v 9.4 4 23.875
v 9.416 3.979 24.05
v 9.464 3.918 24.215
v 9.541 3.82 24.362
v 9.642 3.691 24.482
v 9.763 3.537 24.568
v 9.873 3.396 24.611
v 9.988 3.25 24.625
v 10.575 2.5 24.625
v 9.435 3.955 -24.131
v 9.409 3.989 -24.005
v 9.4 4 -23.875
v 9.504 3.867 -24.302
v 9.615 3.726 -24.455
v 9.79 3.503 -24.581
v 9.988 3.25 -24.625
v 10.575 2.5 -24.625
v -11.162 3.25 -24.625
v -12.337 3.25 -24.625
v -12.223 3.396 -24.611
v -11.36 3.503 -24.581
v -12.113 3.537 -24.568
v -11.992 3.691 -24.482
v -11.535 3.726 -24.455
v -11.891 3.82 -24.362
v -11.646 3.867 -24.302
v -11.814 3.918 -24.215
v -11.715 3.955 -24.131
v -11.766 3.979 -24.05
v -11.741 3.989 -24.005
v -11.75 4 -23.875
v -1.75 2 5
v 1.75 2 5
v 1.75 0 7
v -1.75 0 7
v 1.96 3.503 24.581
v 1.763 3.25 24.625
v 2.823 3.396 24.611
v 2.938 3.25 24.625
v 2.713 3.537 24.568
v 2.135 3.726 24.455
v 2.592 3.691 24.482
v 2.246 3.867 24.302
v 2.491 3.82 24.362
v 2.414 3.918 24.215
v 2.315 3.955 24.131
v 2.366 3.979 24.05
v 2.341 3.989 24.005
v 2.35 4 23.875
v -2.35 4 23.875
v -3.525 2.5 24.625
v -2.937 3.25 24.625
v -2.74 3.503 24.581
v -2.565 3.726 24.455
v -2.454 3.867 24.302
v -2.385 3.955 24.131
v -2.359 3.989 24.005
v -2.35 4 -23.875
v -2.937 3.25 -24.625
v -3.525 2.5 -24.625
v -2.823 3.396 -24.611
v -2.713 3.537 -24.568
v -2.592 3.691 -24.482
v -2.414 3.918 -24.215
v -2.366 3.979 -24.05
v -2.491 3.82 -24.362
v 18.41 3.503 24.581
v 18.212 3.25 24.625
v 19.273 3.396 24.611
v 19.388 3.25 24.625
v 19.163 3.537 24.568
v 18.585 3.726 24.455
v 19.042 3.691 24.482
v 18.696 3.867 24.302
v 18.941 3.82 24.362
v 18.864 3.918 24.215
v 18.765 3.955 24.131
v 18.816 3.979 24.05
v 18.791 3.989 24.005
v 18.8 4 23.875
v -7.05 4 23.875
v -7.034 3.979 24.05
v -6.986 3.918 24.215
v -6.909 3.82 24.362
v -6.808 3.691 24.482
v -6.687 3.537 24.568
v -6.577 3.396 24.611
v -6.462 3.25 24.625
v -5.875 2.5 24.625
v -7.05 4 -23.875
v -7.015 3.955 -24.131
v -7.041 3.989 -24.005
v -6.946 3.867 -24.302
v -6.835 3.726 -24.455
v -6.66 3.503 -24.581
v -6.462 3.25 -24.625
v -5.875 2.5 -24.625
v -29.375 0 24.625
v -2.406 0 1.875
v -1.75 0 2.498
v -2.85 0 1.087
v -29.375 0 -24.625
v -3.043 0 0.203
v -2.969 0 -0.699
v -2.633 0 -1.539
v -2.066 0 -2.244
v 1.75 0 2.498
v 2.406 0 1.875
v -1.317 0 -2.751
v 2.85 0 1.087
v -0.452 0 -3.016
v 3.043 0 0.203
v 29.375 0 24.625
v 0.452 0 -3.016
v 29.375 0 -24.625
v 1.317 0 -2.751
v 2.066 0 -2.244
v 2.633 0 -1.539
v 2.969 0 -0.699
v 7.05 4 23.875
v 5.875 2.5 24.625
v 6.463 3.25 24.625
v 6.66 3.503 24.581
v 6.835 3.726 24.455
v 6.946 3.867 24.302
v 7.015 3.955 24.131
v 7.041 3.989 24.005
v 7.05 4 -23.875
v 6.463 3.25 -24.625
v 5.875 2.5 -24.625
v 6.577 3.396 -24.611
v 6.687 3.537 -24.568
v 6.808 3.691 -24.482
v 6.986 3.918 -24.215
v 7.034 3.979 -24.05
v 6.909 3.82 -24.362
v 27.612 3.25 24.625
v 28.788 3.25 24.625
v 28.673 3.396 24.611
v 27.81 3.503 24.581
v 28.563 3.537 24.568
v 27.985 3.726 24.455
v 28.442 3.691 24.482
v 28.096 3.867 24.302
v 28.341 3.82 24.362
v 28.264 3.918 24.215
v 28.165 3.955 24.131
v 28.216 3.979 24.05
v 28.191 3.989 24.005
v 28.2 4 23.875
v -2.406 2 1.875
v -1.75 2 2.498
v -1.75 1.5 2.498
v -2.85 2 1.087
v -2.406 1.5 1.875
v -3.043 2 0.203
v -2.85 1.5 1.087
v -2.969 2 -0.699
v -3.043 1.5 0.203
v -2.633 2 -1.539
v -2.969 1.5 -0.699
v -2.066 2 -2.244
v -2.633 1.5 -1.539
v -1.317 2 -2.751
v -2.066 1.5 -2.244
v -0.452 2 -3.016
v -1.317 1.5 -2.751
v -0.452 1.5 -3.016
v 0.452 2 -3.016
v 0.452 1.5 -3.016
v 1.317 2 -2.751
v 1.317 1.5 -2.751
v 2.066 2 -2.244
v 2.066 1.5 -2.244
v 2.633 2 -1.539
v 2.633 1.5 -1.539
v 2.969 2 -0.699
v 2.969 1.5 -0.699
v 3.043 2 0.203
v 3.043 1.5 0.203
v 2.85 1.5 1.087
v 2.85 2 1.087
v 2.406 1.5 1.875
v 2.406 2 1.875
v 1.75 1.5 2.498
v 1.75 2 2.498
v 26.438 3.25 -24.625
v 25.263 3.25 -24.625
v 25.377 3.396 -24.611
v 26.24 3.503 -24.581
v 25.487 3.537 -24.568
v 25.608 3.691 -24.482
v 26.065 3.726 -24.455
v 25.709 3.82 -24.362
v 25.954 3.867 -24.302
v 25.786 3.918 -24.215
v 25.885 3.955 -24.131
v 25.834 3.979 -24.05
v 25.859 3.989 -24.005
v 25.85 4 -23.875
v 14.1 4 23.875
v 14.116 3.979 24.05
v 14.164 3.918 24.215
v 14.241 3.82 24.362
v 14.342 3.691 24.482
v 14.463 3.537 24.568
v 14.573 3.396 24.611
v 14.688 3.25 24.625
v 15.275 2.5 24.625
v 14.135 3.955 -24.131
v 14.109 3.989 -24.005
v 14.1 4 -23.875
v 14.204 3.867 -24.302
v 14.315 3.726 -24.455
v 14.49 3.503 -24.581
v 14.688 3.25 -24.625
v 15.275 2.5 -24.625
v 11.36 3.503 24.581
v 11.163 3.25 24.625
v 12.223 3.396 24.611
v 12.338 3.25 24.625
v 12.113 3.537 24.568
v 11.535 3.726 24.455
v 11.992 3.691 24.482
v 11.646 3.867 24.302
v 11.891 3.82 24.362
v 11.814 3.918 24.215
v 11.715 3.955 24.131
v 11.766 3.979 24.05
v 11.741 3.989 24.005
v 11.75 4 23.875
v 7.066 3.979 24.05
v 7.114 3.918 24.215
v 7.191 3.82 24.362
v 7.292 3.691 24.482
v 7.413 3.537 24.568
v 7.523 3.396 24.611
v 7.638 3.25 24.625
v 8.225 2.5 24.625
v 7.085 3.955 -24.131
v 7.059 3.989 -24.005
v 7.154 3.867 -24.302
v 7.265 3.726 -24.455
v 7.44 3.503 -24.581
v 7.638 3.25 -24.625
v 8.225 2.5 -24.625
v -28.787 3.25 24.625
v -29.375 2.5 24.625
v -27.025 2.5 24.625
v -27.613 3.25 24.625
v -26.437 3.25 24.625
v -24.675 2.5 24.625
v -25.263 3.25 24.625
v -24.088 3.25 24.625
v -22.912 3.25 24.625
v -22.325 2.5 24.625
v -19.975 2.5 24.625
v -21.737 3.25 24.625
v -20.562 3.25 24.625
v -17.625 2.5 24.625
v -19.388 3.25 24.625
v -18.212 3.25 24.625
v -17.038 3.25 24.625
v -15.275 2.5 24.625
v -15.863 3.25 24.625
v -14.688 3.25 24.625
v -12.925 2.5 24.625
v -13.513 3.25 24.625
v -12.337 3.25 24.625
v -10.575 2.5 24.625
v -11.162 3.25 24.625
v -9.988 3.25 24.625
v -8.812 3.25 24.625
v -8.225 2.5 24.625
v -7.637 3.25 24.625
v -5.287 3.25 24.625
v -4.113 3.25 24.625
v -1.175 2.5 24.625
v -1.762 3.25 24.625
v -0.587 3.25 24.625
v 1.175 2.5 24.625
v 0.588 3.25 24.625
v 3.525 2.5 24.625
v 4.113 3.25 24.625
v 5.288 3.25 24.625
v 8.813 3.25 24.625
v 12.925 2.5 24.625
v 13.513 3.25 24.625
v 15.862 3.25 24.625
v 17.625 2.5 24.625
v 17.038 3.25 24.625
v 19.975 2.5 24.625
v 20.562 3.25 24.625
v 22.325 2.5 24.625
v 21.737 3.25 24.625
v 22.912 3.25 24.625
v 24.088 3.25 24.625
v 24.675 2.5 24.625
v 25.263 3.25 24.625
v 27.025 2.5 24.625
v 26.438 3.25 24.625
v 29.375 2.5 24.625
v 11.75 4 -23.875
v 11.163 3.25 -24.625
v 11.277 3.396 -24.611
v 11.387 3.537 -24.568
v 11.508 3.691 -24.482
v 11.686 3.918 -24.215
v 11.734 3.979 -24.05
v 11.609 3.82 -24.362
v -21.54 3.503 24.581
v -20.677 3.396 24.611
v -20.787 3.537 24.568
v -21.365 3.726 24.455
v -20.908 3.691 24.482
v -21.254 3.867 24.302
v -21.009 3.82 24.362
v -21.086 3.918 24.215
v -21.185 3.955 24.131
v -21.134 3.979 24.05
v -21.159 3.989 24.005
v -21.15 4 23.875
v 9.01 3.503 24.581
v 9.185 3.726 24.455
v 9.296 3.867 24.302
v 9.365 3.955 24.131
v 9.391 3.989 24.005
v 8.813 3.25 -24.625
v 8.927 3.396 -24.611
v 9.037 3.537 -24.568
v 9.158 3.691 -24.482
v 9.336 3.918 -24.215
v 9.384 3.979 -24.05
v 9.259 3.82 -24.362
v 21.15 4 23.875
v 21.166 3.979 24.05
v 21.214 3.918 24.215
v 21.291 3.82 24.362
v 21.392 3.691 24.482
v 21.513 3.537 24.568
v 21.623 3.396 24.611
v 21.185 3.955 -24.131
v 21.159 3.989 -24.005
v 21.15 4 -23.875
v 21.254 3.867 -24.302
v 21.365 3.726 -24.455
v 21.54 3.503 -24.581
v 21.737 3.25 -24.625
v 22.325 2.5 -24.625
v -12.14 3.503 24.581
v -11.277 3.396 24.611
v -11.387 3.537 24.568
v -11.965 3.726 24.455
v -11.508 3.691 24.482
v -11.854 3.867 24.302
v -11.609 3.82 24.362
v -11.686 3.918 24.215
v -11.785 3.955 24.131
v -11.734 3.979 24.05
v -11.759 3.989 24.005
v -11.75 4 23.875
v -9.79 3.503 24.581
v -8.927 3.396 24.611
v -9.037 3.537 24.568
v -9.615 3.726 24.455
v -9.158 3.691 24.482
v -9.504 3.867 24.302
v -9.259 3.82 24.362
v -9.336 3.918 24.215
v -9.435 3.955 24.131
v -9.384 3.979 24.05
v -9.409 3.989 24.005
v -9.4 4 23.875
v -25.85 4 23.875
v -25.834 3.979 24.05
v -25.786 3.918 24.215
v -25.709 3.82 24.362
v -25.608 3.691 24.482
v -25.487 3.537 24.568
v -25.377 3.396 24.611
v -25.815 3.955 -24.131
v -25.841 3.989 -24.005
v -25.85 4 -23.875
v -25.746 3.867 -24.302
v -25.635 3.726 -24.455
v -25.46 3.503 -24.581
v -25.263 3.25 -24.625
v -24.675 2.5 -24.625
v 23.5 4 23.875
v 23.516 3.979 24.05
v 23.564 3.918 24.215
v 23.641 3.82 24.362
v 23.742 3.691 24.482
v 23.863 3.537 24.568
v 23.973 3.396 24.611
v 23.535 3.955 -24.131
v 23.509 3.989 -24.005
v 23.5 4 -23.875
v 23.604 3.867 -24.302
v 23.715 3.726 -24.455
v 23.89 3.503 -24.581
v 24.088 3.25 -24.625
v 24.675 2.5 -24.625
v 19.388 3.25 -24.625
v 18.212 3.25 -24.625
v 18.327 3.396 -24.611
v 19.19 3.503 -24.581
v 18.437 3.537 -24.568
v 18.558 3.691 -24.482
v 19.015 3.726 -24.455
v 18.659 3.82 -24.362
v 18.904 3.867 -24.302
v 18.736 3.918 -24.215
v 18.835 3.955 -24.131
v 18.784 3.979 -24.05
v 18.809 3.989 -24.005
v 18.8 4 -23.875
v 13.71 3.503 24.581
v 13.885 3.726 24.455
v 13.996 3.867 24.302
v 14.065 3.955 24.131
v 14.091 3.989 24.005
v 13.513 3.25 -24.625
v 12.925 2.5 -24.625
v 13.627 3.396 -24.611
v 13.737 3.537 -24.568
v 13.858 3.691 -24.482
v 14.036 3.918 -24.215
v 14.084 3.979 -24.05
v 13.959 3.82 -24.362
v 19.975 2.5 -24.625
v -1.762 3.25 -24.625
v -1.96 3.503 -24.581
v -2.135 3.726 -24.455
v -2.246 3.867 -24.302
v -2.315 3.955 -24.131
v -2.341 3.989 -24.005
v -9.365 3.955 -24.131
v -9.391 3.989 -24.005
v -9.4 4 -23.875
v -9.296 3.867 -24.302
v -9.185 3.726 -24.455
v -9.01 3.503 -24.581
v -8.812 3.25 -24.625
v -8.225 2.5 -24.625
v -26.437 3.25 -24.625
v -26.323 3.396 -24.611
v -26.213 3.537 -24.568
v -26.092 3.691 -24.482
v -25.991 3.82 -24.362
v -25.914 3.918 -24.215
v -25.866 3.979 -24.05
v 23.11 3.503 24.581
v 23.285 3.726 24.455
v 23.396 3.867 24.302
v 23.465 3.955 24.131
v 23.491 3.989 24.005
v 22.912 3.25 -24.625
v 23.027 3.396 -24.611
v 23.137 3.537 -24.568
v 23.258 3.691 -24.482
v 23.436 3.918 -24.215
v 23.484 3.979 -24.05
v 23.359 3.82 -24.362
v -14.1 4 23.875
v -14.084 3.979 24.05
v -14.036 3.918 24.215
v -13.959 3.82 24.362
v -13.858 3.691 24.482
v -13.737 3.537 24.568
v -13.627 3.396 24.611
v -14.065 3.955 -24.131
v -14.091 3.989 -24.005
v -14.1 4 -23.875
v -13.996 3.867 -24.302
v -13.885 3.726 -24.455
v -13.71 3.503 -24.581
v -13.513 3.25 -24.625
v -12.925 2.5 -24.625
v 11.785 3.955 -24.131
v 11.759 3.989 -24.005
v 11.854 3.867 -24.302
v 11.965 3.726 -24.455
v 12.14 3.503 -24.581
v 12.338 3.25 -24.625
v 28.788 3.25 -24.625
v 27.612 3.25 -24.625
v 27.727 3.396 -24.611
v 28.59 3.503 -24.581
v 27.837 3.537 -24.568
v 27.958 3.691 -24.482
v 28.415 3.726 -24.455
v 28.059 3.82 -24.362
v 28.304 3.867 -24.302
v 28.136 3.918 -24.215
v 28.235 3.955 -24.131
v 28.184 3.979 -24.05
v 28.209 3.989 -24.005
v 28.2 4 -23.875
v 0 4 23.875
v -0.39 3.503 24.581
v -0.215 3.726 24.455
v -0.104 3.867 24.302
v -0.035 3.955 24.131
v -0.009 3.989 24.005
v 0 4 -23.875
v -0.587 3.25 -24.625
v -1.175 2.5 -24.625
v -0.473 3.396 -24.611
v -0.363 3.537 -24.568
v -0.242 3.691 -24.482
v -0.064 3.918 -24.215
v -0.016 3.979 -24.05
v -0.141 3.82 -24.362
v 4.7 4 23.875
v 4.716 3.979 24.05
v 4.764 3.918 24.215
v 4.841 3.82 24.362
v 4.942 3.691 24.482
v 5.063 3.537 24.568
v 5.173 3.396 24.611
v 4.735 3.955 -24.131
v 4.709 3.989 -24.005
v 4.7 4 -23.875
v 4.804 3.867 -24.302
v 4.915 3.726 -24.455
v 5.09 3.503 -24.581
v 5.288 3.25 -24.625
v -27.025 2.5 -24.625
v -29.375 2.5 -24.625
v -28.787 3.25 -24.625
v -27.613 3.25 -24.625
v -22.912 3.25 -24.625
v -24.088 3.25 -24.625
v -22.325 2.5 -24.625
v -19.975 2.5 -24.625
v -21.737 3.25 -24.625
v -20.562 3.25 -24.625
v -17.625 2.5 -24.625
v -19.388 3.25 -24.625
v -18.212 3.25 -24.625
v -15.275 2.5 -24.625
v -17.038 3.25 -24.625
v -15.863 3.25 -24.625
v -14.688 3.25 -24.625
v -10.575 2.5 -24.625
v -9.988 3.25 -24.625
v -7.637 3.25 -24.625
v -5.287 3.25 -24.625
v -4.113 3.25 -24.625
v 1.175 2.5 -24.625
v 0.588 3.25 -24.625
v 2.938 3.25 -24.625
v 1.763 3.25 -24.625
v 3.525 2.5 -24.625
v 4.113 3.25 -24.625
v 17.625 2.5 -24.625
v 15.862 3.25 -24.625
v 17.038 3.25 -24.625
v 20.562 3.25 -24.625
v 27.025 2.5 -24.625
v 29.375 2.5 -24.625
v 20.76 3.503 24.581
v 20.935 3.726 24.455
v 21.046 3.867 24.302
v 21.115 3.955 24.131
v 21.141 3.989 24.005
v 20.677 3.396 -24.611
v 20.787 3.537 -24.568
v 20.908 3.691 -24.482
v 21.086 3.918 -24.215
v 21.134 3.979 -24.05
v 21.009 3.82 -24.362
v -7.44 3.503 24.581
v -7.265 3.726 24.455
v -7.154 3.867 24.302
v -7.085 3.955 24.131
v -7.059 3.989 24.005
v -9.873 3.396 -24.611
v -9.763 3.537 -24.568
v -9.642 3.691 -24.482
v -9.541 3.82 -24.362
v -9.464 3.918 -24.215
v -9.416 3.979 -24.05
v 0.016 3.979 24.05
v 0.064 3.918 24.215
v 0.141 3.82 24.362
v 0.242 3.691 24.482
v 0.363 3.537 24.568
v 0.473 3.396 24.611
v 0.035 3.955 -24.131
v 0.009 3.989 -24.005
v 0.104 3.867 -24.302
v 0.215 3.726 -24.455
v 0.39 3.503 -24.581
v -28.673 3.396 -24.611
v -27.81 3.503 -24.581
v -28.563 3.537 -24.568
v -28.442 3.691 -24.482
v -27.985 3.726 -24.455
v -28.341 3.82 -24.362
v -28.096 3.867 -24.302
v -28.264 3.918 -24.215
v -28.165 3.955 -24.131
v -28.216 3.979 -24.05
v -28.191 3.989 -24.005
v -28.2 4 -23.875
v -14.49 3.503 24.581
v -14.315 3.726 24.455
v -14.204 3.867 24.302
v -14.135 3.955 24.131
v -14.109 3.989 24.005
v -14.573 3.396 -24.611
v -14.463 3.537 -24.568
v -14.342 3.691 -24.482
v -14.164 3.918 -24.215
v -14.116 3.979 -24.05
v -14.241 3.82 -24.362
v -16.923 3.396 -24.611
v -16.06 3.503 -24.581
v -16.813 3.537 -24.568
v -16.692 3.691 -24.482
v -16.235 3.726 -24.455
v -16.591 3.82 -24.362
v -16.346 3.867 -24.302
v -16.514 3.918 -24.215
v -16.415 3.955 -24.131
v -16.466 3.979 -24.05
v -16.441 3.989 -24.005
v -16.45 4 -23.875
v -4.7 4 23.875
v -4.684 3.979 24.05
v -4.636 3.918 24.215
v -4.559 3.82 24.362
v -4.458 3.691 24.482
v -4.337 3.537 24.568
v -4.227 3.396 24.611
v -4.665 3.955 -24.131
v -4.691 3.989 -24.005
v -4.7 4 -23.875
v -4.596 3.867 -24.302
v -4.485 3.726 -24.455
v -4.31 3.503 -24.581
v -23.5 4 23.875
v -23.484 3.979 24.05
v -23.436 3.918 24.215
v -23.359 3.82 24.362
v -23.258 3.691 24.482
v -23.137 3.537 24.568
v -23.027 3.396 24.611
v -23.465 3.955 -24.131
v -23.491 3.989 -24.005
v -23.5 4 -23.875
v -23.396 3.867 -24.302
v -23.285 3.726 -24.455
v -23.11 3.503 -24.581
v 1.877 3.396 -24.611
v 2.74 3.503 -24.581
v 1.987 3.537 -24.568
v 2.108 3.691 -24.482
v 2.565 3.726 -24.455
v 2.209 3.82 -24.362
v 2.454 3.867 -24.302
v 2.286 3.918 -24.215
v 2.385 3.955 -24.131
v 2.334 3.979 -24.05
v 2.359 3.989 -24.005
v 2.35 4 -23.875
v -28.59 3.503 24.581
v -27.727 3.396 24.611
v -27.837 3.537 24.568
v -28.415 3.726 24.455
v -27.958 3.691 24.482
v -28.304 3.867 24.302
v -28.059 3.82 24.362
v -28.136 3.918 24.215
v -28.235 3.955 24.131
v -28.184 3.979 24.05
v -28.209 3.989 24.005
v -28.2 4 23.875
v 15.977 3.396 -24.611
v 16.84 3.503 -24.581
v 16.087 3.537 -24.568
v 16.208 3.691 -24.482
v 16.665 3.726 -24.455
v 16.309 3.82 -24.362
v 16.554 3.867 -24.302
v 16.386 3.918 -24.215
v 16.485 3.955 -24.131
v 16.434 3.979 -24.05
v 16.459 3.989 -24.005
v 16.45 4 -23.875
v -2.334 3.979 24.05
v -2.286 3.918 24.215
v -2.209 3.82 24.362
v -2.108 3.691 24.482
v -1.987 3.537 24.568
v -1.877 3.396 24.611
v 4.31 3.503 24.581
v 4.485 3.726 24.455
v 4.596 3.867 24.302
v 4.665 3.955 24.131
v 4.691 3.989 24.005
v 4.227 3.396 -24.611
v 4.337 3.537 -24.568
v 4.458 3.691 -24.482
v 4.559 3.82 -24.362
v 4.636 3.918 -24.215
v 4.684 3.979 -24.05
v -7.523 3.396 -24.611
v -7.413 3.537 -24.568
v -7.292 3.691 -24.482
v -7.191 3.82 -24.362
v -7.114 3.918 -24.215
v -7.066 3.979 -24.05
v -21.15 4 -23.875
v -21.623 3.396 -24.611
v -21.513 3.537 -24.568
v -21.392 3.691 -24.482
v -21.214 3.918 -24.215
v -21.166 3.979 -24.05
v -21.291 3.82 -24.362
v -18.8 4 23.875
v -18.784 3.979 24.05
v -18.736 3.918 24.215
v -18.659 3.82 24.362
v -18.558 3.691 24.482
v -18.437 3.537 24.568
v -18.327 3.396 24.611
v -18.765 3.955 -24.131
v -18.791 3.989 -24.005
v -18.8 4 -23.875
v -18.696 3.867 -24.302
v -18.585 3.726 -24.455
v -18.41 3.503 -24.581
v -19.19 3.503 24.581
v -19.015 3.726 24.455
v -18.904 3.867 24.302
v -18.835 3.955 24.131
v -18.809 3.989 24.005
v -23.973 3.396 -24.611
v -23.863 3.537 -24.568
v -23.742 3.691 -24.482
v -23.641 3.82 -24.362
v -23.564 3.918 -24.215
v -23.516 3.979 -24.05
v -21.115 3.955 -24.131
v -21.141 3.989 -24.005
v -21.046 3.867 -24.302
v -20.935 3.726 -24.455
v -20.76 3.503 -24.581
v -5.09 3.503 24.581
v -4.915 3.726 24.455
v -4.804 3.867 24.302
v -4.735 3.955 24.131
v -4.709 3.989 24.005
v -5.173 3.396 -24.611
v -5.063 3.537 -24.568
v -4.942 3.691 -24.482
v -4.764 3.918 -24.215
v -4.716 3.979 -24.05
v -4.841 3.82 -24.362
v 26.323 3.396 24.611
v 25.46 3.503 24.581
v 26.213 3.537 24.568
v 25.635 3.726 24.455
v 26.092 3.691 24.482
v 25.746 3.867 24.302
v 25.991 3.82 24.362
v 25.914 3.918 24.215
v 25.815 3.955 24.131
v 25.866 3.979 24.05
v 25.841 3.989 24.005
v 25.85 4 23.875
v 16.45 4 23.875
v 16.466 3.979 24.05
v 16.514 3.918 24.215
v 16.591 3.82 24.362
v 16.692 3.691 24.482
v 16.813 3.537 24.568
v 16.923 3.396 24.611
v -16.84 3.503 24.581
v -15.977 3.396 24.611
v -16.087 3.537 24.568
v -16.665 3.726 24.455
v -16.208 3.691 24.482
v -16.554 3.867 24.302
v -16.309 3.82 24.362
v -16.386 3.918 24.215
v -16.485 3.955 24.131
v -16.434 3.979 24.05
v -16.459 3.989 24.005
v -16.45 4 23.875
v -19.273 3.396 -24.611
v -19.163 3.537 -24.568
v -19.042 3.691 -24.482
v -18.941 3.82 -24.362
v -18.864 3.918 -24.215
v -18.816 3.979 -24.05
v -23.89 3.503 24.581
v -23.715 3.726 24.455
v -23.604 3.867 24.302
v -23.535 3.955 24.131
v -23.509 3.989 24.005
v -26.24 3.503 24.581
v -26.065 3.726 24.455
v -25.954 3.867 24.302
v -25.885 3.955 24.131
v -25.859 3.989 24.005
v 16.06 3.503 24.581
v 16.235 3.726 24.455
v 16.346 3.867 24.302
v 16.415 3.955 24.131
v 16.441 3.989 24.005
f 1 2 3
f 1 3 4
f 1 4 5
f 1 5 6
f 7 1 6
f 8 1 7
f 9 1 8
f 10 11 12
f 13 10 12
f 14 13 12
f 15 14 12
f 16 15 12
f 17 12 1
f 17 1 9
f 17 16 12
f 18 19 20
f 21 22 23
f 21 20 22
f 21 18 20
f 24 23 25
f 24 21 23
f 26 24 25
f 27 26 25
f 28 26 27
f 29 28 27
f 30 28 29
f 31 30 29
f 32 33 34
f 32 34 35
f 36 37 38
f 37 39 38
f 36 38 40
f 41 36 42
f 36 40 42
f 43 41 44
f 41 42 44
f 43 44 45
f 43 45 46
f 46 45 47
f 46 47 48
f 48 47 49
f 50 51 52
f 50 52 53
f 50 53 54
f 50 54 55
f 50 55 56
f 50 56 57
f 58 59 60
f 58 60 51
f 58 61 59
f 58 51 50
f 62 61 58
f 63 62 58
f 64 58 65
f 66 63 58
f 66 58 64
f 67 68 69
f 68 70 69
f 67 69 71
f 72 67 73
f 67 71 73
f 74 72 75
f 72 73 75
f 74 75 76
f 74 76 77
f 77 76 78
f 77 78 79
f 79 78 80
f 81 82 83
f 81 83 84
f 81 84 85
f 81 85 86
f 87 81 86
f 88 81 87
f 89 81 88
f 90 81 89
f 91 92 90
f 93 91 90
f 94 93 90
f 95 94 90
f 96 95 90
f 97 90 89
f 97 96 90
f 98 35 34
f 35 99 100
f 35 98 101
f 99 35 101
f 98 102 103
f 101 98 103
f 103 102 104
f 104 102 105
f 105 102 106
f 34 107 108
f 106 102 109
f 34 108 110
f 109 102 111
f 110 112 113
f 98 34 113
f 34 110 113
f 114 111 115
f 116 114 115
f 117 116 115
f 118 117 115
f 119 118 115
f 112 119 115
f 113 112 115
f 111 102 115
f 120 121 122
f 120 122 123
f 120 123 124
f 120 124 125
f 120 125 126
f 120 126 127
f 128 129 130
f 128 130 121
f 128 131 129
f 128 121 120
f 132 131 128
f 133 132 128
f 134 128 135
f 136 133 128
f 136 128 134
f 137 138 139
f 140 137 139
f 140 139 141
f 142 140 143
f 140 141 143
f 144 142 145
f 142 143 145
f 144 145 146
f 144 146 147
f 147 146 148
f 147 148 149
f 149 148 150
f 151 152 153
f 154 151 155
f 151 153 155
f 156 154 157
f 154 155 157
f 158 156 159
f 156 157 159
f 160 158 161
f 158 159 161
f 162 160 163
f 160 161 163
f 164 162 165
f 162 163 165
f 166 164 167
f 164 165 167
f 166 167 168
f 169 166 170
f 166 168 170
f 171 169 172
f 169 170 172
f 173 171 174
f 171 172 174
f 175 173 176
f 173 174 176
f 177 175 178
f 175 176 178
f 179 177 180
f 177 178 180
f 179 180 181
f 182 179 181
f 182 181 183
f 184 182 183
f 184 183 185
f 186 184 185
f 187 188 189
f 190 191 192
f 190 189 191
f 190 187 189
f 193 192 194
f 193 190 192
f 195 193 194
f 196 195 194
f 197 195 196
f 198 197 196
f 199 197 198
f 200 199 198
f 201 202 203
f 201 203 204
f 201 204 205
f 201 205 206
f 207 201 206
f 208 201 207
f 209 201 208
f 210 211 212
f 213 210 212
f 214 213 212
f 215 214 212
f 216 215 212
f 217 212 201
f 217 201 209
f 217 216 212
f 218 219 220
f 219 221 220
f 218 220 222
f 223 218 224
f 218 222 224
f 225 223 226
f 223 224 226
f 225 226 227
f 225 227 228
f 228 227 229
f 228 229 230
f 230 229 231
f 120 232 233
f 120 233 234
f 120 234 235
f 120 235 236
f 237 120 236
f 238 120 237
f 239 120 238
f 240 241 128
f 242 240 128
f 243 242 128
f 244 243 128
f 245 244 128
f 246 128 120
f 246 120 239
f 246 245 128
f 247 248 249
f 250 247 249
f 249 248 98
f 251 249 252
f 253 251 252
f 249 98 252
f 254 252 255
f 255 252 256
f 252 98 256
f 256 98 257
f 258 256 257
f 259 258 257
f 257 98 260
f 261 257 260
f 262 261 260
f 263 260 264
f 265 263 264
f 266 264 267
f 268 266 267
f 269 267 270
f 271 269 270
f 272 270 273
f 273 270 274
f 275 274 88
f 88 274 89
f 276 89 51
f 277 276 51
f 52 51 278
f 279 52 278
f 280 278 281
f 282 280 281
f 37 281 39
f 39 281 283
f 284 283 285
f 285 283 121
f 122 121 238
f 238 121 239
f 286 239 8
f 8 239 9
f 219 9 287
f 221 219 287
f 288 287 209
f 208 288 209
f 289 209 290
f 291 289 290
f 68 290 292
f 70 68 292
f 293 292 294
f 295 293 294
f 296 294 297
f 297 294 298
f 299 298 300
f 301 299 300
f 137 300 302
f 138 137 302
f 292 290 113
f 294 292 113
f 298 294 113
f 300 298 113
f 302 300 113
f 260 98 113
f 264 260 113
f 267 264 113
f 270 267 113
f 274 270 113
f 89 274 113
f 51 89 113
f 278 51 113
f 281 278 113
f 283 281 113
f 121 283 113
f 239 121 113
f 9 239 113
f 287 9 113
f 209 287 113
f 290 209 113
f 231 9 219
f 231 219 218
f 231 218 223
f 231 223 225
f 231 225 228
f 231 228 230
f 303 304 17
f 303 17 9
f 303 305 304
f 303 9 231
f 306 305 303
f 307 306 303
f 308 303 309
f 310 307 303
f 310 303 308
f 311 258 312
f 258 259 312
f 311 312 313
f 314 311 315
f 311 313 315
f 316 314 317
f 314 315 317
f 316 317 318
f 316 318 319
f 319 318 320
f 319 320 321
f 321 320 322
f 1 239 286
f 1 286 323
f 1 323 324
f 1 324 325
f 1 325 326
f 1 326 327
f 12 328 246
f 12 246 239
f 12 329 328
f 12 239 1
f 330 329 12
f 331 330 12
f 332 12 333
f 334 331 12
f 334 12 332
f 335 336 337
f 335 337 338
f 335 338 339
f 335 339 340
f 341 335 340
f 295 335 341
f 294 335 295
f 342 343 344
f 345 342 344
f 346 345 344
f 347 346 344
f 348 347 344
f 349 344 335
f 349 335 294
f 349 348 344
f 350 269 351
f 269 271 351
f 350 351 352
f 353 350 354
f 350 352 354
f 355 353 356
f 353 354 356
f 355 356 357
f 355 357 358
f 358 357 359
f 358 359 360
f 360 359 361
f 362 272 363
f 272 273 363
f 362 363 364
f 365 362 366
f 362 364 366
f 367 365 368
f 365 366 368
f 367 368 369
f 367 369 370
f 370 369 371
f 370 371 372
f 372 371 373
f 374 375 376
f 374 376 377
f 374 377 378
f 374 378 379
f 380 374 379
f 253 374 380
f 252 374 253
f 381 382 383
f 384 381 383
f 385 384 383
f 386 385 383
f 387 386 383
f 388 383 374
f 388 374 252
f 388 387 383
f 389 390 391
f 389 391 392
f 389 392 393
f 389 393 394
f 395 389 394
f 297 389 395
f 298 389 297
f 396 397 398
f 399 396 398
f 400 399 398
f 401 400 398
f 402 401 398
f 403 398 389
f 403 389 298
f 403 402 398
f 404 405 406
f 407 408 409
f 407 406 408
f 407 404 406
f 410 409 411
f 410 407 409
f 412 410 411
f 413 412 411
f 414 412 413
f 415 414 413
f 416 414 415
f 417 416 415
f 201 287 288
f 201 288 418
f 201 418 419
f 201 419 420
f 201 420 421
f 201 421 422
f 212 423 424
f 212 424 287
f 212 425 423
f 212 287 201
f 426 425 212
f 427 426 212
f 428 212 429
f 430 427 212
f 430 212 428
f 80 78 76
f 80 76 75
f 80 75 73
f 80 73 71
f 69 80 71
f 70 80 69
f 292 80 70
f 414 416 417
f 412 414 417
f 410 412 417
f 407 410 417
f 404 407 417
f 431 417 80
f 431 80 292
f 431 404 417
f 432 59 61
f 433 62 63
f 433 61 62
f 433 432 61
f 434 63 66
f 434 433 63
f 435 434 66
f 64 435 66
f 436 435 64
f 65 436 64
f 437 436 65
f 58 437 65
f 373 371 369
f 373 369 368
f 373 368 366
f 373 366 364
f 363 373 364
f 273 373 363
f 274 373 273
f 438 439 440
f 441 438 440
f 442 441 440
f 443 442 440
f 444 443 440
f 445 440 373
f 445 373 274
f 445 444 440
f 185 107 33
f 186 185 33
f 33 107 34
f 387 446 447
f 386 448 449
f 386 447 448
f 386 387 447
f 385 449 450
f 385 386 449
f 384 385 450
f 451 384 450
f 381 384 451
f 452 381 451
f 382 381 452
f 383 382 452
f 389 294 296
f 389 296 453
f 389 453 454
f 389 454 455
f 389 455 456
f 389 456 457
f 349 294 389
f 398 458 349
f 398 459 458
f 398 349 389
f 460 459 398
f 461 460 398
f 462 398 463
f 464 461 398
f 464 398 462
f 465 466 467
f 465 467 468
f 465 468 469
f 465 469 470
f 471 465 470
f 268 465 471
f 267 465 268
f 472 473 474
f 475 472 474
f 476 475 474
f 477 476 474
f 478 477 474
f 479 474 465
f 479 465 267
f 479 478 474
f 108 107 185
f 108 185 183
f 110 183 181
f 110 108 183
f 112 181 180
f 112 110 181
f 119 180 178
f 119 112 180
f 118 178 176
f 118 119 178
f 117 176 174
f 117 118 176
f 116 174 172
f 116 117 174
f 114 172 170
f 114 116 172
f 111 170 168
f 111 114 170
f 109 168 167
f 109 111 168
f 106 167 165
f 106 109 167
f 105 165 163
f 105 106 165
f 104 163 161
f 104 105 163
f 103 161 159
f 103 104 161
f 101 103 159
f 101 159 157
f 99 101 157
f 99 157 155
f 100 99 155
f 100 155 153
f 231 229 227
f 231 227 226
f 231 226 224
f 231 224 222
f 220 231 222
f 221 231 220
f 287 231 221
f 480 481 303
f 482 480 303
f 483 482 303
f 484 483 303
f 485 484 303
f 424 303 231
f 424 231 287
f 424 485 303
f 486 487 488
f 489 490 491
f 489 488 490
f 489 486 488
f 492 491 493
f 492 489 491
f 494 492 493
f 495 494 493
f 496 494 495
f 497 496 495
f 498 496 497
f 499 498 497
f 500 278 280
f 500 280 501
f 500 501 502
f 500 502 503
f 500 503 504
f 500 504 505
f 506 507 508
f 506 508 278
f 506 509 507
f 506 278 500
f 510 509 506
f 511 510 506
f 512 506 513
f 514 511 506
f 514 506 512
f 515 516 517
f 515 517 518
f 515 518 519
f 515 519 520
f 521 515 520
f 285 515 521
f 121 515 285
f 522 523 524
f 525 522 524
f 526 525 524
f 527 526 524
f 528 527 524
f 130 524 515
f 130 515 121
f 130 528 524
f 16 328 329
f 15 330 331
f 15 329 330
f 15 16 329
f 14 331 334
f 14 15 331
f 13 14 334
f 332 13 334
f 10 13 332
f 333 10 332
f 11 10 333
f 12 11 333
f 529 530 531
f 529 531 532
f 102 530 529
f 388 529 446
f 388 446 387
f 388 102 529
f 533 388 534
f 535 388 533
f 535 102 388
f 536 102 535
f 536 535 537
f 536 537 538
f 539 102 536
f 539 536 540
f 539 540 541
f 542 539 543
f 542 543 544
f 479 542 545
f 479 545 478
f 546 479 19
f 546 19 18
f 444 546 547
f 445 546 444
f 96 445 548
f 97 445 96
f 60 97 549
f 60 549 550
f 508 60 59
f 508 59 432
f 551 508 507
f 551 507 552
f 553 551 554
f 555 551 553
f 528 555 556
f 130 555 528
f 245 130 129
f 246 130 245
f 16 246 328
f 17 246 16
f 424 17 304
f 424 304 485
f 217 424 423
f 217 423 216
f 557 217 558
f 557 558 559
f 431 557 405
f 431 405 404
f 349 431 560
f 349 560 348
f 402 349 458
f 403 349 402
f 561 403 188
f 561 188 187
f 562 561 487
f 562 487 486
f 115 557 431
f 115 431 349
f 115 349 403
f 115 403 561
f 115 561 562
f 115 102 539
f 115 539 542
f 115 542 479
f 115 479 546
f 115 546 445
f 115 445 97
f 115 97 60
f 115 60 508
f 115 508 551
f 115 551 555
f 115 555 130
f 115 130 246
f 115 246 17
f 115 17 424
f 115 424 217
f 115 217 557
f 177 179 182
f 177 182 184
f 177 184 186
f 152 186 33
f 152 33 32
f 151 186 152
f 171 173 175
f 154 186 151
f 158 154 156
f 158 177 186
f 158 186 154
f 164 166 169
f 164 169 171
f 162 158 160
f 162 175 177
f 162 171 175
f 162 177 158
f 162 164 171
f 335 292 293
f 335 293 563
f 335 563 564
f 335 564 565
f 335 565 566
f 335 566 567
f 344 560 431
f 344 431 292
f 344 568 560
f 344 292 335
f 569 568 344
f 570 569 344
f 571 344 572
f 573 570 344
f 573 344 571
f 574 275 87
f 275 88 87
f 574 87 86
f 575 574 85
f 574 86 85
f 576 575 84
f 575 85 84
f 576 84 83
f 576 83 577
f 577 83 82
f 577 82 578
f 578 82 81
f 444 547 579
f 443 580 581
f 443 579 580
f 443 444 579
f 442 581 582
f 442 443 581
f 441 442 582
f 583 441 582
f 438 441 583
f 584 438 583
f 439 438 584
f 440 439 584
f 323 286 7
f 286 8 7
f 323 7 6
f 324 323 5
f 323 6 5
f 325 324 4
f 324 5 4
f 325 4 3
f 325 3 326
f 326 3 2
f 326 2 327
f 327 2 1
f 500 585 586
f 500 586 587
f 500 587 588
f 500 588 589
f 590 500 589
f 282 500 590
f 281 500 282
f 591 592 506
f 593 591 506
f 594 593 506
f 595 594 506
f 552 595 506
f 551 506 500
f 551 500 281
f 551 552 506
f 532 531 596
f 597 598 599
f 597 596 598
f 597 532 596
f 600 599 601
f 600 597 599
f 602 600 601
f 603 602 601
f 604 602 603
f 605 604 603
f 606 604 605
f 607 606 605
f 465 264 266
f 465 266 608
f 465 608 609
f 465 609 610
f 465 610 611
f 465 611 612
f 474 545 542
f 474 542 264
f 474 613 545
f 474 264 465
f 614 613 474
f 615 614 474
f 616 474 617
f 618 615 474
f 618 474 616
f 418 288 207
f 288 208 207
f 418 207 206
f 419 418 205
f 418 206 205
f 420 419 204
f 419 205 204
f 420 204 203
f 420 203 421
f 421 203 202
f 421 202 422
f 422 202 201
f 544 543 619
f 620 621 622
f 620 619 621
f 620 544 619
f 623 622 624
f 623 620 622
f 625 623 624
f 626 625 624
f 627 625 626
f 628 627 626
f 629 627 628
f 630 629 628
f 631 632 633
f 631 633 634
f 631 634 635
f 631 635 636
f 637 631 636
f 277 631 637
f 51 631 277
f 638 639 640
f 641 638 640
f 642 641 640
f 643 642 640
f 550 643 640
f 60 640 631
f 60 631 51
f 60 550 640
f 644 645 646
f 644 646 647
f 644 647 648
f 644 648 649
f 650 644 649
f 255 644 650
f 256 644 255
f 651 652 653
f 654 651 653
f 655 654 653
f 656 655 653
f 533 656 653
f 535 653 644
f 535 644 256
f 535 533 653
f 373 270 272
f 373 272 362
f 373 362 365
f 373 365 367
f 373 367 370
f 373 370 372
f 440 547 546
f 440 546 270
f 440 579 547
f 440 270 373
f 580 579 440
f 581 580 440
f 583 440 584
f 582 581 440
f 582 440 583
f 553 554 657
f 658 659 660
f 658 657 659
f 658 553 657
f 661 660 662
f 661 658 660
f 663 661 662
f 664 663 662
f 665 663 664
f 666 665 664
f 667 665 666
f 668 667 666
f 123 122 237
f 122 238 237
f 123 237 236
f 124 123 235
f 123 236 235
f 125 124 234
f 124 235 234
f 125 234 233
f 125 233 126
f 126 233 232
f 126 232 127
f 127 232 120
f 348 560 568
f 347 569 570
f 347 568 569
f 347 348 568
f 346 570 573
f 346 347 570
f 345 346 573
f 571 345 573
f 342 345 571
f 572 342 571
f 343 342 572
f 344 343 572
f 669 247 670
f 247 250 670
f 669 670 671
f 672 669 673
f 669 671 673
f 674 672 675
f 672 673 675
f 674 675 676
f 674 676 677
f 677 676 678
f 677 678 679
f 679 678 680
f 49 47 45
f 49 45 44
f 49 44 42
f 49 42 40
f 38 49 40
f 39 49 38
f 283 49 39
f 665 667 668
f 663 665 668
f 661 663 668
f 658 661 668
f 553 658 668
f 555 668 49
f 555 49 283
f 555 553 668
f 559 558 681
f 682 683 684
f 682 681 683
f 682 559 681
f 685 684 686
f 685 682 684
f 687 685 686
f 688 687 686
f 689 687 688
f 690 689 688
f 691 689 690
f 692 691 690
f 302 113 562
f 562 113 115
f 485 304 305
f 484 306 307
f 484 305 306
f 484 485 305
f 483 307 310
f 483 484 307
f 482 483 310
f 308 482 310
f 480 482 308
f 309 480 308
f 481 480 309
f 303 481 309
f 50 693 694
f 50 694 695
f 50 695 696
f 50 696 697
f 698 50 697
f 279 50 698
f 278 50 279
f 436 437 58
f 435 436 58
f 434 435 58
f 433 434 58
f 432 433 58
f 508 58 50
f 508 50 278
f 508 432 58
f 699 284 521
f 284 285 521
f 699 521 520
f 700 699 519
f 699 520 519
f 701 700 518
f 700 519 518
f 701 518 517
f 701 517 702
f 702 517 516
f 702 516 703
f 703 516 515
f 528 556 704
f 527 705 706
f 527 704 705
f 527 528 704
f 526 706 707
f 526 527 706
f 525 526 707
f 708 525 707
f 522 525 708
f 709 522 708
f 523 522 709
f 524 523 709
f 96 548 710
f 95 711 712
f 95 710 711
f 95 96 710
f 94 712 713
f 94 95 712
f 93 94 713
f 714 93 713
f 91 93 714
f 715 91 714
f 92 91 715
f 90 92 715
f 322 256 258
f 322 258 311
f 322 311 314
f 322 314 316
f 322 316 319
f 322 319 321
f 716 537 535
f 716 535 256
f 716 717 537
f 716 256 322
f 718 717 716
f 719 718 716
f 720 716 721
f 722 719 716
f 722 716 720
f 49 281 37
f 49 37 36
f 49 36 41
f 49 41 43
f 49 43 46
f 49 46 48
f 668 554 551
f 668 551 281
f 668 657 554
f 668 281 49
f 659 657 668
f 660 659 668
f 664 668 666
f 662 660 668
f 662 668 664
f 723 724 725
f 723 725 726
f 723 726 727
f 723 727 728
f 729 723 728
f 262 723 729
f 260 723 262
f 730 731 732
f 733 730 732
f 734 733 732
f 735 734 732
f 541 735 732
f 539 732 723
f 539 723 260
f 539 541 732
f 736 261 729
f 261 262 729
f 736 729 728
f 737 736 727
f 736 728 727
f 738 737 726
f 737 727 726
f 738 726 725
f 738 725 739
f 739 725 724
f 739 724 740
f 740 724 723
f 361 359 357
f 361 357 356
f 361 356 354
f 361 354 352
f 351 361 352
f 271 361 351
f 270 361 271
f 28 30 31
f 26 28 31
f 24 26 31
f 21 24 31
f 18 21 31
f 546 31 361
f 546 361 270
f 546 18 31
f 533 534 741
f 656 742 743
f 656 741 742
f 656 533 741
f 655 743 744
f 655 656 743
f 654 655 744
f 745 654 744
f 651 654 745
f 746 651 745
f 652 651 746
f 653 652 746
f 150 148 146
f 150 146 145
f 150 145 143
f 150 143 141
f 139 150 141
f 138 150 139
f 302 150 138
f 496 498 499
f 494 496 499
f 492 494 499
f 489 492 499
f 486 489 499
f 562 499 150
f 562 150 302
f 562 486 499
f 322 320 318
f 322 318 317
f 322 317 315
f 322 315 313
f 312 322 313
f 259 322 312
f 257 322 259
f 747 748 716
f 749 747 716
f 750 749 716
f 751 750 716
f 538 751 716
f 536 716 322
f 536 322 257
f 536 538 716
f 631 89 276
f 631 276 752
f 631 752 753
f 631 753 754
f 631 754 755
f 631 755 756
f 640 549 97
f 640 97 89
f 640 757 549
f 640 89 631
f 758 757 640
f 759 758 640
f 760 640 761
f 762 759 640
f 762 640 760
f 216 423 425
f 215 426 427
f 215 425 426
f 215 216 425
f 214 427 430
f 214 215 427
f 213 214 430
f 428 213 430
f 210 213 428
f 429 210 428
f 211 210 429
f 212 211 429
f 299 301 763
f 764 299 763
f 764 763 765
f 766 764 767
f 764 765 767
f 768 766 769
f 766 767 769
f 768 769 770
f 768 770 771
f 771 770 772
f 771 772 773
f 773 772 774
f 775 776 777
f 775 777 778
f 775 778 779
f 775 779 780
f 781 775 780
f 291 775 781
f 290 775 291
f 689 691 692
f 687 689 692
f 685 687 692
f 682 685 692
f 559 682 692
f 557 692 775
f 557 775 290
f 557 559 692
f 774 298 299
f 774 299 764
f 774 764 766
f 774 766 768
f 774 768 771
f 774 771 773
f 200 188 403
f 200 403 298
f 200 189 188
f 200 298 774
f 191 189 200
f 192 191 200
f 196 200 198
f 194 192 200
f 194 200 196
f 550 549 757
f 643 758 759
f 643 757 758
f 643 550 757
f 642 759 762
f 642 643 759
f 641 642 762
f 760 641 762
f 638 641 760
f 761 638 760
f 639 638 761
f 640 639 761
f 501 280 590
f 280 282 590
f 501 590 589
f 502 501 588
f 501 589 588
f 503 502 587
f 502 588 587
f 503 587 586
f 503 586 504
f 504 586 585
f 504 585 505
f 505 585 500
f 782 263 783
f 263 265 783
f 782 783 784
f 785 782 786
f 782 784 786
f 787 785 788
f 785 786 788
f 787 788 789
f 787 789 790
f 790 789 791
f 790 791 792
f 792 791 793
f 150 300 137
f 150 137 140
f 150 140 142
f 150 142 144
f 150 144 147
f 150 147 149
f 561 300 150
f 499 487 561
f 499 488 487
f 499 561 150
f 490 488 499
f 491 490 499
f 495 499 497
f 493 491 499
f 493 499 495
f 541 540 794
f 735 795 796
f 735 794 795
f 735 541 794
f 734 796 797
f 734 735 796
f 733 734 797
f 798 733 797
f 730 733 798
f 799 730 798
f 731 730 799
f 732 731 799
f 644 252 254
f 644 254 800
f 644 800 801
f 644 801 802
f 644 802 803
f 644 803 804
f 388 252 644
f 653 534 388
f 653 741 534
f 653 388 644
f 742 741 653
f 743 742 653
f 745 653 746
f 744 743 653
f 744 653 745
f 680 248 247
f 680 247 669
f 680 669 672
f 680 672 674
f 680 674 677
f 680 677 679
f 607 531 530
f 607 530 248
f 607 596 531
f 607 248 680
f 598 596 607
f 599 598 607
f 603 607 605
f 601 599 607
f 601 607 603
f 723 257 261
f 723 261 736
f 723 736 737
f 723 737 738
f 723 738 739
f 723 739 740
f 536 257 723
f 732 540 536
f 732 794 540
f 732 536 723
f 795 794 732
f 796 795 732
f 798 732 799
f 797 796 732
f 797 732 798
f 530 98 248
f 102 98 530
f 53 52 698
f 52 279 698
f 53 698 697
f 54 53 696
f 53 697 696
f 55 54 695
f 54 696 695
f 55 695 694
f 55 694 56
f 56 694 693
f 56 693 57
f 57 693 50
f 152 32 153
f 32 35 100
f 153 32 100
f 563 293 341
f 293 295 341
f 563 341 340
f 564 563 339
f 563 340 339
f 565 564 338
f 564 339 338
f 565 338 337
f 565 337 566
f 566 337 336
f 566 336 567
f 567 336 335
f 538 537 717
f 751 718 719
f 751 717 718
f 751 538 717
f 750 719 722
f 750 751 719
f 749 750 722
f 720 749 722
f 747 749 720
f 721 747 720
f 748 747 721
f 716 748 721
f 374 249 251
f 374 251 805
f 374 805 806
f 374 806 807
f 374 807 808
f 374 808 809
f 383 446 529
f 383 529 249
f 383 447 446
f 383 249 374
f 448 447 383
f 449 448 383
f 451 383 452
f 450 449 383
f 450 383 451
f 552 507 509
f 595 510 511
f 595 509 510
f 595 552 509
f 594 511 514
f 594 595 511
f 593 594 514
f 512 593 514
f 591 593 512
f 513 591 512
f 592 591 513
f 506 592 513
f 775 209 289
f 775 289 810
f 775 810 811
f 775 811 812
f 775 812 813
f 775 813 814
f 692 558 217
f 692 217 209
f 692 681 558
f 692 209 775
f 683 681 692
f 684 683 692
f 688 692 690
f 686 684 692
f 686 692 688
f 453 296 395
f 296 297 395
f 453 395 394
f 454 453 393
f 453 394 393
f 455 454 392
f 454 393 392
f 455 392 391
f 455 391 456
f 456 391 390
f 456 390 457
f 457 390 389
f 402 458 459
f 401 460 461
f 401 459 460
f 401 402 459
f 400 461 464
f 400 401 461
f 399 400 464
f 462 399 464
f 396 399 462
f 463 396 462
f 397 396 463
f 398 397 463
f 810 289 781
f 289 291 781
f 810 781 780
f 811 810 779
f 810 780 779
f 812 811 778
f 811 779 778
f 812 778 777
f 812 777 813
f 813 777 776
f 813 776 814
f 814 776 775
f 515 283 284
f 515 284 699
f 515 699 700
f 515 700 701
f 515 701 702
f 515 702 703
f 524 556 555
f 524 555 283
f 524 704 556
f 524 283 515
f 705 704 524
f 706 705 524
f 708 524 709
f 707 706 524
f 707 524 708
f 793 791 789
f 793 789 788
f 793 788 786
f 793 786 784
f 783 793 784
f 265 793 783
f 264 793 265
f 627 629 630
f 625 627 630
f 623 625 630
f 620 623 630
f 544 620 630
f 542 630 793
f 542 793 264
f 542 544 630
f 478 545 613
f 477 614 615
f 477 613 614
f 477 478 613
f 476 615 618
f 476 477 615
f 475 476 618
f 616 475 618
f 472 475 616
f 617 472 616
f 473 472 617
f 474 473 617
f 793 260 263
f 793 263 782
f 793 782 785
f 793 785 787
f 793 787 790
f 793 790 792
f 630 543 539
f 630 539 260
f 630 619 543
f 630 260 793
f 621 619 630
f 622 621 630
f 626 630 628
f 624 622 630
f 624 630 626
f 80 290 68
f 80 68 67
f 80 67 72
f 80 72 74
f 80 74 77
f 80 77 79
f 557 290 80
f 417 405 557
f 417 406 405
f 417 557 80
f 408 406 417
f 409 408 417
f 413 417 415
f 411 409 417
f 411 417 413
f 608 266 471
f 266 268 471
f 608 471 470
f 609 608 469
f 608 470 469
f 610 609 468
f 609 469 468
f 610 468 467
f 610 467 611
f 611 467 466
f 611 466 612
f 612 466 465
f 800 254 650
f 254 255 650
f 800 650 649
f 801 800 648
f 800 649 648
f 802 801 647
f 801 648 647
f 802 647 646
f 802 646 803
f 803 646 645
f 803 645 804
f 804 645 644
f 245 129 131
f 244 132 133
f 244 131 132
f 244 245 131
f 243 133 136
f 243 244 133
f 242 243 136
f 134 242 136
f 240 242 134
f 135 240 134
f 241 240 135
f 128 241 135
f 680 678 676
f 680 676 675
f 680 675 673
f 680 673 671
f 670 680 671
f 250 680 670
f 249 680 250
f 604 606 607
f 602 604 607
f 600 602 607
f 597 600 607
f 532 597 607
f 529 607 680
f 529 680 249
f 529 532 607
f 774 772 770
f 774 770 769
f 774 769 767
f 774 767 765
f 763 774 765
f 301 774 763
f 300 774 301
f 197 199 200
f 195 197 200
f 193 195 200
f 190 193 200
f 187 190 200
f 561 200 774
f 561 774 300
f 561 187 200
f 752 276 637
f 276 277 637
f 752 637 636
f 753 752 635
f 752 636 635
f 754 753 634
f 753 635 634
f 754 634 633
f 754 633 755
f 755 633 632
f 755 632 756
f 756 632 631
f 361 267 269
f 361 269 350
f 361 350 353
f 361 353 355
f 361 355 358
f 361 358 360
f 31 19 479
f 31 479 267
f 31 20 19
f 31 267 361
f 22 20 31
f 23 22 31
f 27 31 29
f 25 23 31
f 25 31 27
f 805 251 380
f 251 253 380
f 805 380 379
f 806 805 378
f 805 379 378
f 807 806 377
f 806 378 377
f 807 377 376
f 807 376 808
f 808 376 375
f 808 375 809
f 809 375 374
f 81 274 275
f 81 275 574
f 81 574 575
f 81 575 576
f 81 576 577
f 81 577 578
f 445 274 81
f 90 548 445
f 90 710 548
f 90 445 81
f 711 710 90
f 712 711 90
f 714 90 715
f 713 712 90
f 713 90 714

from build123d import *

# Parameters (mm, degrees)
SKETCH1_W           = 58.75
SKETCH1_H           = 49.25
SKETCH1_R           = 3.05
BOSS_EXTRUDE1_DEPTH = 1.5
BOSS_EXTRUDE2_DEPTH = 49.25
CUT_EXTRUDE1_DEPTH  = 2
CUT_EXTRUDE3_DEPTH  = 64.827526389
CHAMFER3_SIZE       = 2


with BuildPart() as part:
    # Sketch1 → Boss-Extrude1 (new body)
    with BuildSketch(Plane(origin=(0, 0, 0), x_dir=(1, 0, 0), z_dir=(0, 1, 0))):
        Rectangle(SKETCH1_W, SKETCH1_H)
        with Locations(Location((0, 0, 0), (0, 0, 270))):
            Circle(SKETCH1_R, mode=Mode.SUBTRACT)
    extrude(amount=BOSS_EXTRUDE1_DEPTH)

    # Sketch2 → Boss-Extrude2 (add)
    with BuildSketch(Plane(origin=(0, 0, -24.625), x_dir=(-1, 0, 0), z_dir=(0, 0, -1))):
        Polygon((-29.375, 1.5), (29.375, 1.5), (29.375, 2.5), (28.2, 4), (27.025, 2.5), (25.85, 4), (24.675, 2.5), (23.5, 4), (22.325, 2.5), (21.15, 4), (19.975, 2.5), (18.8, 4), (17.625, 2.5), (16.45, 4), (15.275, 2.5), (14.1, 4), (12.925, 2.5), (11.75, 4), (10.575, 2.5), (9.4, 4), (8.225, 2.5), (7.05, 4), (5.875, 2.5), (4.7, 4), (3.525, 2.5), (2.35, 4), (1.175, 2.5), (0, 4), (-1.175, 2.5), (-2.35, 4), (-3.525, 2.5), (-4.7, 4), (-5.875, 2.5), (-7.05, 4), (-8.225, 2.5), (-9.4, 4), (-10.575, 2.5), (-11.75, 4), (-12.925, 2.5), (-14.1, 4), (-15.275, 2.5), (-16.45, 4), (-17.625, 2.5), (-18.8, 4), (-19.975, 2.5), (-21.15, 4), (-22.325, 2.5), (-23.5, 4), (-24.675, 2.5), (-25.85, 4), (-27.025, 2.5), (-28.2, 4), (-29.375, 2.5), align=None)
    extrude(amount=-BOSS_EXTRUDE2_DEPTH)

    # Sketch3 → Cut-Extrude1 (cut)
    with BuildSketch(Plane(origin=(0, 0, 0), x_dir=(-1, 0, 0), z_dir=(0, -1, 0))):
        with BuildLine():
            Line((-1.75, -2.497999199), (-1.75, -5))
            Line((-1.75, -5), (1.75, -5))
            Line((1.75, -5), (1.75, -2.497999199))
            ThreePointArc((1.75, -2.497999199), (0, 3.05), (-1.75, -2.497999199))
        make_face()
    extrude(amount=-CUT_EXTRUDE1_DEPTH, mode=Mode.SUBTRACT)

    # Sketch4 → Cut-Extrude3 (cut, through all)
    with BuildSketch(Plane(origin=(29.375, 0, 0), x_dir=(0, 0, -1), z_dir=(1, 0, 0))):
        with BuildLine():
            Line((-23.875, 4), (-24.625, 4))
            Line((-24.625, 4), (-24.625, 3.25))
            ThreePointArc((-24.625, 3.25), (-24.405330086, 3.780330086), (-23.875, 4))
        make_face()
    cut_extrude3 = extrude(amount=-CUT_EXTRUDE3_DEPTH, mode=Mode.SUBTRACT)

    # Mirror1: Cut-Extrude3 across plane
    add(cut_extrude3.mirror(Plane.XY), mode=Mode.SUBTRACT)

    # Chamfer3
    chamfer3_edges = [part.edges().sort_by_distance(p)[0] for p in [
        (0, 0, 5),
    ]]
    chamfer(chamfer3_edges, length=CHAMFER3_SIZE - 0.0001)  # a hair under: the kernel refuses the full size


solid = part.part
